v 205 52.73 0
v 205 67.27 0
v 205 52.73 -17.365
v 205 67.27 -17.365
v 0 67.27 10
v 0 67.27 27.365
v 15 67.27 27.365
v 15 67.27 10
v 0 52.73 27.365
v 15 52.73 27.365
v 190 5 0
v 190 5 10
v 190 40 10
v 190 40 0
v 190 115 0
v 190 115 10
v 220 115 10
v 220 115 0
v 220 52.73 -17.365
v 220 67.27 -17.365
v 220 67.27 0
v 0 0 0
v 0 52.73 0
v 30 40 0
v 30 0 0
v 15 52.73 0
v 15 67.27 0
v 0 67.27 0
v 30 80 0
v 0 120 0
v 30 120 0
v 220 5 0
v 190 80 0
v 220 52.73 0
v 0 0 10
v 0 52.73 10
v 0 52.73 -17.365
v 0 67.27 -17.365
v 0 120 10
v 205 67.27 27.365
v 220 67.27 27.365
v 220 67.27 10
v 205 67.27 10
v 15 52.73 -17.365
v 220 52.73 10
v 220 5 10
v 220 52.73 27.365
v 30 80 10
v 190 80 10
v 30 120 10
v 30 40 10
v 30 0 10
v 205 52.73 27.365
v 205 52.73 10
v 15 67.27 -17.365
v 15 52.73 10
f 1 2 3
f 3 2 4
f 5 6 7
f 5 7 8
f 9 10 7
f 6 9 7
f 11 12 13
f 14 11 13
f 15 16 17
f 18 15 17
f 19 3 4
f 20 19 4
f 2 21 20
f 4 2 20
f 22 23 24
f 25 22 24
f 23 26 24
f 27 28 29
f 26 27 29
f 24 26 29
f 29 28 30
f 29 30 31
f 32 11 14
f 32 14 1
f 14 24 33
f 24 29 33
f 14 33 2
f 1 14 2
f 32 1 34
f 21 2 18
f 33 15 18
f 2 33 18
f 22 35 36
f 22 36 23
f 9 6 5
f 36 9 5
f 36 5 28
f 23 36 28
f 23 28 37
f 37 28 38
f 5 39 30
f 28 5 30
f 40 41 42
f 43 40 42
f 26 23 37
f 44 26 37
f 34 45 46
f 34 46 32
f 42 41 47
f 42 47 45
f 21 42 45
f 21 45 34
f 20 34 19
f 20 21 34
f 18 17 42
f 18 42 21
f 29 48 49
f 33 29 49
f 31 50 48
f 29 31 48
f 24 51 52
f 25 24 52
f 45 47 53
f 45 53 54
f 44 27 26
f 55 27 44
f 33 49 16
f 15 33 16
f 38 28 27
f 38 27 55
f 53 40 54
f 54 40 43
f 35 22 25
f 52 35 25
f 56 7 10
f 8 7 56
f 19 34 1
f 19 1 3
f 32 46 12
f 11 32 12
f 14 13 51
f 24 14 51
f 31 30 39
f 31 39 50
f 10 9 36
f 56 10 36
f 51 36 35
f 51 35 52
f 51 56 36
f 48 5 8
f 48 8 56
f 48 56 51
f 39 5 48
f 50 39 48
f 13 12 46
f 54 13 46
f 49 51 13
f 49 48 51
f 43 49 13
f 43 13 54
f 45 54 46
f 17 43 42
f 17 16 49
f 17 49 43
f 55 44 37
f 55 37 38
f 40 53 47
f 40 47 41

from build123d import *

# Parameters (mm, degrees)
SKETCH_1_W          = 220
SKETCH_1_H          = 120
EXTRUDE_1_DEPTH     = 10
CUT_EXTRUDE_1_DEPTH = 10
SKETCH_5_W          = 44.73
SKETCH_5_H          = 14.54
EXTRUDE_2_DEPTH     = 15


with BuildPart() as part:
    # 草图1 → 凸台-拉伸1 (new body)
    with BuildSketch(Plane.XY):
        with Locations((110, 60)):
            Rectangle(SKETCH_1_W, SKETCH_1_H)
    extrude(amount=EXTRUDE_1_DEPTH)

    # 草图2 → 切除-拉伸1 (cut)
    with BuildSketch(Plane.XY.offset(10)):
        Polygon((220, 120), (30, 120), (30, 80), (190, 80), (190, 115), (220, 115), align=None)
        Polygon((220, 0), (220, 5), (190, 5), (190, 40), (30, 40), (30, 0), align=None)
    extrude(amount=-CUT_EXTRUDE_1_DEPTH, mode=Mode.SUBTRACT)

    # 草图5 → 凸台-拉伸2 (add)
    with BuildSketch(Plane(origin=(220, 0, 0), x_dir=(0, 0, -1), z_dir=(1, 0, 0))):
        with Locations((-5, 60)):
            Rectangle(SKETCH_5_W, SKETCH_5_H)
    extrude_2 = extrude(amount=-EXTRUDE_2_DEPTH)

    # 镜向1: 凸台-拉伸2 across plane
    add(extrude_2.mirror(Plane(origin=(110, 0, 0), x_dir=(0, 0, 1), z_dir=(1, 0, 0))))


solid = part.part
